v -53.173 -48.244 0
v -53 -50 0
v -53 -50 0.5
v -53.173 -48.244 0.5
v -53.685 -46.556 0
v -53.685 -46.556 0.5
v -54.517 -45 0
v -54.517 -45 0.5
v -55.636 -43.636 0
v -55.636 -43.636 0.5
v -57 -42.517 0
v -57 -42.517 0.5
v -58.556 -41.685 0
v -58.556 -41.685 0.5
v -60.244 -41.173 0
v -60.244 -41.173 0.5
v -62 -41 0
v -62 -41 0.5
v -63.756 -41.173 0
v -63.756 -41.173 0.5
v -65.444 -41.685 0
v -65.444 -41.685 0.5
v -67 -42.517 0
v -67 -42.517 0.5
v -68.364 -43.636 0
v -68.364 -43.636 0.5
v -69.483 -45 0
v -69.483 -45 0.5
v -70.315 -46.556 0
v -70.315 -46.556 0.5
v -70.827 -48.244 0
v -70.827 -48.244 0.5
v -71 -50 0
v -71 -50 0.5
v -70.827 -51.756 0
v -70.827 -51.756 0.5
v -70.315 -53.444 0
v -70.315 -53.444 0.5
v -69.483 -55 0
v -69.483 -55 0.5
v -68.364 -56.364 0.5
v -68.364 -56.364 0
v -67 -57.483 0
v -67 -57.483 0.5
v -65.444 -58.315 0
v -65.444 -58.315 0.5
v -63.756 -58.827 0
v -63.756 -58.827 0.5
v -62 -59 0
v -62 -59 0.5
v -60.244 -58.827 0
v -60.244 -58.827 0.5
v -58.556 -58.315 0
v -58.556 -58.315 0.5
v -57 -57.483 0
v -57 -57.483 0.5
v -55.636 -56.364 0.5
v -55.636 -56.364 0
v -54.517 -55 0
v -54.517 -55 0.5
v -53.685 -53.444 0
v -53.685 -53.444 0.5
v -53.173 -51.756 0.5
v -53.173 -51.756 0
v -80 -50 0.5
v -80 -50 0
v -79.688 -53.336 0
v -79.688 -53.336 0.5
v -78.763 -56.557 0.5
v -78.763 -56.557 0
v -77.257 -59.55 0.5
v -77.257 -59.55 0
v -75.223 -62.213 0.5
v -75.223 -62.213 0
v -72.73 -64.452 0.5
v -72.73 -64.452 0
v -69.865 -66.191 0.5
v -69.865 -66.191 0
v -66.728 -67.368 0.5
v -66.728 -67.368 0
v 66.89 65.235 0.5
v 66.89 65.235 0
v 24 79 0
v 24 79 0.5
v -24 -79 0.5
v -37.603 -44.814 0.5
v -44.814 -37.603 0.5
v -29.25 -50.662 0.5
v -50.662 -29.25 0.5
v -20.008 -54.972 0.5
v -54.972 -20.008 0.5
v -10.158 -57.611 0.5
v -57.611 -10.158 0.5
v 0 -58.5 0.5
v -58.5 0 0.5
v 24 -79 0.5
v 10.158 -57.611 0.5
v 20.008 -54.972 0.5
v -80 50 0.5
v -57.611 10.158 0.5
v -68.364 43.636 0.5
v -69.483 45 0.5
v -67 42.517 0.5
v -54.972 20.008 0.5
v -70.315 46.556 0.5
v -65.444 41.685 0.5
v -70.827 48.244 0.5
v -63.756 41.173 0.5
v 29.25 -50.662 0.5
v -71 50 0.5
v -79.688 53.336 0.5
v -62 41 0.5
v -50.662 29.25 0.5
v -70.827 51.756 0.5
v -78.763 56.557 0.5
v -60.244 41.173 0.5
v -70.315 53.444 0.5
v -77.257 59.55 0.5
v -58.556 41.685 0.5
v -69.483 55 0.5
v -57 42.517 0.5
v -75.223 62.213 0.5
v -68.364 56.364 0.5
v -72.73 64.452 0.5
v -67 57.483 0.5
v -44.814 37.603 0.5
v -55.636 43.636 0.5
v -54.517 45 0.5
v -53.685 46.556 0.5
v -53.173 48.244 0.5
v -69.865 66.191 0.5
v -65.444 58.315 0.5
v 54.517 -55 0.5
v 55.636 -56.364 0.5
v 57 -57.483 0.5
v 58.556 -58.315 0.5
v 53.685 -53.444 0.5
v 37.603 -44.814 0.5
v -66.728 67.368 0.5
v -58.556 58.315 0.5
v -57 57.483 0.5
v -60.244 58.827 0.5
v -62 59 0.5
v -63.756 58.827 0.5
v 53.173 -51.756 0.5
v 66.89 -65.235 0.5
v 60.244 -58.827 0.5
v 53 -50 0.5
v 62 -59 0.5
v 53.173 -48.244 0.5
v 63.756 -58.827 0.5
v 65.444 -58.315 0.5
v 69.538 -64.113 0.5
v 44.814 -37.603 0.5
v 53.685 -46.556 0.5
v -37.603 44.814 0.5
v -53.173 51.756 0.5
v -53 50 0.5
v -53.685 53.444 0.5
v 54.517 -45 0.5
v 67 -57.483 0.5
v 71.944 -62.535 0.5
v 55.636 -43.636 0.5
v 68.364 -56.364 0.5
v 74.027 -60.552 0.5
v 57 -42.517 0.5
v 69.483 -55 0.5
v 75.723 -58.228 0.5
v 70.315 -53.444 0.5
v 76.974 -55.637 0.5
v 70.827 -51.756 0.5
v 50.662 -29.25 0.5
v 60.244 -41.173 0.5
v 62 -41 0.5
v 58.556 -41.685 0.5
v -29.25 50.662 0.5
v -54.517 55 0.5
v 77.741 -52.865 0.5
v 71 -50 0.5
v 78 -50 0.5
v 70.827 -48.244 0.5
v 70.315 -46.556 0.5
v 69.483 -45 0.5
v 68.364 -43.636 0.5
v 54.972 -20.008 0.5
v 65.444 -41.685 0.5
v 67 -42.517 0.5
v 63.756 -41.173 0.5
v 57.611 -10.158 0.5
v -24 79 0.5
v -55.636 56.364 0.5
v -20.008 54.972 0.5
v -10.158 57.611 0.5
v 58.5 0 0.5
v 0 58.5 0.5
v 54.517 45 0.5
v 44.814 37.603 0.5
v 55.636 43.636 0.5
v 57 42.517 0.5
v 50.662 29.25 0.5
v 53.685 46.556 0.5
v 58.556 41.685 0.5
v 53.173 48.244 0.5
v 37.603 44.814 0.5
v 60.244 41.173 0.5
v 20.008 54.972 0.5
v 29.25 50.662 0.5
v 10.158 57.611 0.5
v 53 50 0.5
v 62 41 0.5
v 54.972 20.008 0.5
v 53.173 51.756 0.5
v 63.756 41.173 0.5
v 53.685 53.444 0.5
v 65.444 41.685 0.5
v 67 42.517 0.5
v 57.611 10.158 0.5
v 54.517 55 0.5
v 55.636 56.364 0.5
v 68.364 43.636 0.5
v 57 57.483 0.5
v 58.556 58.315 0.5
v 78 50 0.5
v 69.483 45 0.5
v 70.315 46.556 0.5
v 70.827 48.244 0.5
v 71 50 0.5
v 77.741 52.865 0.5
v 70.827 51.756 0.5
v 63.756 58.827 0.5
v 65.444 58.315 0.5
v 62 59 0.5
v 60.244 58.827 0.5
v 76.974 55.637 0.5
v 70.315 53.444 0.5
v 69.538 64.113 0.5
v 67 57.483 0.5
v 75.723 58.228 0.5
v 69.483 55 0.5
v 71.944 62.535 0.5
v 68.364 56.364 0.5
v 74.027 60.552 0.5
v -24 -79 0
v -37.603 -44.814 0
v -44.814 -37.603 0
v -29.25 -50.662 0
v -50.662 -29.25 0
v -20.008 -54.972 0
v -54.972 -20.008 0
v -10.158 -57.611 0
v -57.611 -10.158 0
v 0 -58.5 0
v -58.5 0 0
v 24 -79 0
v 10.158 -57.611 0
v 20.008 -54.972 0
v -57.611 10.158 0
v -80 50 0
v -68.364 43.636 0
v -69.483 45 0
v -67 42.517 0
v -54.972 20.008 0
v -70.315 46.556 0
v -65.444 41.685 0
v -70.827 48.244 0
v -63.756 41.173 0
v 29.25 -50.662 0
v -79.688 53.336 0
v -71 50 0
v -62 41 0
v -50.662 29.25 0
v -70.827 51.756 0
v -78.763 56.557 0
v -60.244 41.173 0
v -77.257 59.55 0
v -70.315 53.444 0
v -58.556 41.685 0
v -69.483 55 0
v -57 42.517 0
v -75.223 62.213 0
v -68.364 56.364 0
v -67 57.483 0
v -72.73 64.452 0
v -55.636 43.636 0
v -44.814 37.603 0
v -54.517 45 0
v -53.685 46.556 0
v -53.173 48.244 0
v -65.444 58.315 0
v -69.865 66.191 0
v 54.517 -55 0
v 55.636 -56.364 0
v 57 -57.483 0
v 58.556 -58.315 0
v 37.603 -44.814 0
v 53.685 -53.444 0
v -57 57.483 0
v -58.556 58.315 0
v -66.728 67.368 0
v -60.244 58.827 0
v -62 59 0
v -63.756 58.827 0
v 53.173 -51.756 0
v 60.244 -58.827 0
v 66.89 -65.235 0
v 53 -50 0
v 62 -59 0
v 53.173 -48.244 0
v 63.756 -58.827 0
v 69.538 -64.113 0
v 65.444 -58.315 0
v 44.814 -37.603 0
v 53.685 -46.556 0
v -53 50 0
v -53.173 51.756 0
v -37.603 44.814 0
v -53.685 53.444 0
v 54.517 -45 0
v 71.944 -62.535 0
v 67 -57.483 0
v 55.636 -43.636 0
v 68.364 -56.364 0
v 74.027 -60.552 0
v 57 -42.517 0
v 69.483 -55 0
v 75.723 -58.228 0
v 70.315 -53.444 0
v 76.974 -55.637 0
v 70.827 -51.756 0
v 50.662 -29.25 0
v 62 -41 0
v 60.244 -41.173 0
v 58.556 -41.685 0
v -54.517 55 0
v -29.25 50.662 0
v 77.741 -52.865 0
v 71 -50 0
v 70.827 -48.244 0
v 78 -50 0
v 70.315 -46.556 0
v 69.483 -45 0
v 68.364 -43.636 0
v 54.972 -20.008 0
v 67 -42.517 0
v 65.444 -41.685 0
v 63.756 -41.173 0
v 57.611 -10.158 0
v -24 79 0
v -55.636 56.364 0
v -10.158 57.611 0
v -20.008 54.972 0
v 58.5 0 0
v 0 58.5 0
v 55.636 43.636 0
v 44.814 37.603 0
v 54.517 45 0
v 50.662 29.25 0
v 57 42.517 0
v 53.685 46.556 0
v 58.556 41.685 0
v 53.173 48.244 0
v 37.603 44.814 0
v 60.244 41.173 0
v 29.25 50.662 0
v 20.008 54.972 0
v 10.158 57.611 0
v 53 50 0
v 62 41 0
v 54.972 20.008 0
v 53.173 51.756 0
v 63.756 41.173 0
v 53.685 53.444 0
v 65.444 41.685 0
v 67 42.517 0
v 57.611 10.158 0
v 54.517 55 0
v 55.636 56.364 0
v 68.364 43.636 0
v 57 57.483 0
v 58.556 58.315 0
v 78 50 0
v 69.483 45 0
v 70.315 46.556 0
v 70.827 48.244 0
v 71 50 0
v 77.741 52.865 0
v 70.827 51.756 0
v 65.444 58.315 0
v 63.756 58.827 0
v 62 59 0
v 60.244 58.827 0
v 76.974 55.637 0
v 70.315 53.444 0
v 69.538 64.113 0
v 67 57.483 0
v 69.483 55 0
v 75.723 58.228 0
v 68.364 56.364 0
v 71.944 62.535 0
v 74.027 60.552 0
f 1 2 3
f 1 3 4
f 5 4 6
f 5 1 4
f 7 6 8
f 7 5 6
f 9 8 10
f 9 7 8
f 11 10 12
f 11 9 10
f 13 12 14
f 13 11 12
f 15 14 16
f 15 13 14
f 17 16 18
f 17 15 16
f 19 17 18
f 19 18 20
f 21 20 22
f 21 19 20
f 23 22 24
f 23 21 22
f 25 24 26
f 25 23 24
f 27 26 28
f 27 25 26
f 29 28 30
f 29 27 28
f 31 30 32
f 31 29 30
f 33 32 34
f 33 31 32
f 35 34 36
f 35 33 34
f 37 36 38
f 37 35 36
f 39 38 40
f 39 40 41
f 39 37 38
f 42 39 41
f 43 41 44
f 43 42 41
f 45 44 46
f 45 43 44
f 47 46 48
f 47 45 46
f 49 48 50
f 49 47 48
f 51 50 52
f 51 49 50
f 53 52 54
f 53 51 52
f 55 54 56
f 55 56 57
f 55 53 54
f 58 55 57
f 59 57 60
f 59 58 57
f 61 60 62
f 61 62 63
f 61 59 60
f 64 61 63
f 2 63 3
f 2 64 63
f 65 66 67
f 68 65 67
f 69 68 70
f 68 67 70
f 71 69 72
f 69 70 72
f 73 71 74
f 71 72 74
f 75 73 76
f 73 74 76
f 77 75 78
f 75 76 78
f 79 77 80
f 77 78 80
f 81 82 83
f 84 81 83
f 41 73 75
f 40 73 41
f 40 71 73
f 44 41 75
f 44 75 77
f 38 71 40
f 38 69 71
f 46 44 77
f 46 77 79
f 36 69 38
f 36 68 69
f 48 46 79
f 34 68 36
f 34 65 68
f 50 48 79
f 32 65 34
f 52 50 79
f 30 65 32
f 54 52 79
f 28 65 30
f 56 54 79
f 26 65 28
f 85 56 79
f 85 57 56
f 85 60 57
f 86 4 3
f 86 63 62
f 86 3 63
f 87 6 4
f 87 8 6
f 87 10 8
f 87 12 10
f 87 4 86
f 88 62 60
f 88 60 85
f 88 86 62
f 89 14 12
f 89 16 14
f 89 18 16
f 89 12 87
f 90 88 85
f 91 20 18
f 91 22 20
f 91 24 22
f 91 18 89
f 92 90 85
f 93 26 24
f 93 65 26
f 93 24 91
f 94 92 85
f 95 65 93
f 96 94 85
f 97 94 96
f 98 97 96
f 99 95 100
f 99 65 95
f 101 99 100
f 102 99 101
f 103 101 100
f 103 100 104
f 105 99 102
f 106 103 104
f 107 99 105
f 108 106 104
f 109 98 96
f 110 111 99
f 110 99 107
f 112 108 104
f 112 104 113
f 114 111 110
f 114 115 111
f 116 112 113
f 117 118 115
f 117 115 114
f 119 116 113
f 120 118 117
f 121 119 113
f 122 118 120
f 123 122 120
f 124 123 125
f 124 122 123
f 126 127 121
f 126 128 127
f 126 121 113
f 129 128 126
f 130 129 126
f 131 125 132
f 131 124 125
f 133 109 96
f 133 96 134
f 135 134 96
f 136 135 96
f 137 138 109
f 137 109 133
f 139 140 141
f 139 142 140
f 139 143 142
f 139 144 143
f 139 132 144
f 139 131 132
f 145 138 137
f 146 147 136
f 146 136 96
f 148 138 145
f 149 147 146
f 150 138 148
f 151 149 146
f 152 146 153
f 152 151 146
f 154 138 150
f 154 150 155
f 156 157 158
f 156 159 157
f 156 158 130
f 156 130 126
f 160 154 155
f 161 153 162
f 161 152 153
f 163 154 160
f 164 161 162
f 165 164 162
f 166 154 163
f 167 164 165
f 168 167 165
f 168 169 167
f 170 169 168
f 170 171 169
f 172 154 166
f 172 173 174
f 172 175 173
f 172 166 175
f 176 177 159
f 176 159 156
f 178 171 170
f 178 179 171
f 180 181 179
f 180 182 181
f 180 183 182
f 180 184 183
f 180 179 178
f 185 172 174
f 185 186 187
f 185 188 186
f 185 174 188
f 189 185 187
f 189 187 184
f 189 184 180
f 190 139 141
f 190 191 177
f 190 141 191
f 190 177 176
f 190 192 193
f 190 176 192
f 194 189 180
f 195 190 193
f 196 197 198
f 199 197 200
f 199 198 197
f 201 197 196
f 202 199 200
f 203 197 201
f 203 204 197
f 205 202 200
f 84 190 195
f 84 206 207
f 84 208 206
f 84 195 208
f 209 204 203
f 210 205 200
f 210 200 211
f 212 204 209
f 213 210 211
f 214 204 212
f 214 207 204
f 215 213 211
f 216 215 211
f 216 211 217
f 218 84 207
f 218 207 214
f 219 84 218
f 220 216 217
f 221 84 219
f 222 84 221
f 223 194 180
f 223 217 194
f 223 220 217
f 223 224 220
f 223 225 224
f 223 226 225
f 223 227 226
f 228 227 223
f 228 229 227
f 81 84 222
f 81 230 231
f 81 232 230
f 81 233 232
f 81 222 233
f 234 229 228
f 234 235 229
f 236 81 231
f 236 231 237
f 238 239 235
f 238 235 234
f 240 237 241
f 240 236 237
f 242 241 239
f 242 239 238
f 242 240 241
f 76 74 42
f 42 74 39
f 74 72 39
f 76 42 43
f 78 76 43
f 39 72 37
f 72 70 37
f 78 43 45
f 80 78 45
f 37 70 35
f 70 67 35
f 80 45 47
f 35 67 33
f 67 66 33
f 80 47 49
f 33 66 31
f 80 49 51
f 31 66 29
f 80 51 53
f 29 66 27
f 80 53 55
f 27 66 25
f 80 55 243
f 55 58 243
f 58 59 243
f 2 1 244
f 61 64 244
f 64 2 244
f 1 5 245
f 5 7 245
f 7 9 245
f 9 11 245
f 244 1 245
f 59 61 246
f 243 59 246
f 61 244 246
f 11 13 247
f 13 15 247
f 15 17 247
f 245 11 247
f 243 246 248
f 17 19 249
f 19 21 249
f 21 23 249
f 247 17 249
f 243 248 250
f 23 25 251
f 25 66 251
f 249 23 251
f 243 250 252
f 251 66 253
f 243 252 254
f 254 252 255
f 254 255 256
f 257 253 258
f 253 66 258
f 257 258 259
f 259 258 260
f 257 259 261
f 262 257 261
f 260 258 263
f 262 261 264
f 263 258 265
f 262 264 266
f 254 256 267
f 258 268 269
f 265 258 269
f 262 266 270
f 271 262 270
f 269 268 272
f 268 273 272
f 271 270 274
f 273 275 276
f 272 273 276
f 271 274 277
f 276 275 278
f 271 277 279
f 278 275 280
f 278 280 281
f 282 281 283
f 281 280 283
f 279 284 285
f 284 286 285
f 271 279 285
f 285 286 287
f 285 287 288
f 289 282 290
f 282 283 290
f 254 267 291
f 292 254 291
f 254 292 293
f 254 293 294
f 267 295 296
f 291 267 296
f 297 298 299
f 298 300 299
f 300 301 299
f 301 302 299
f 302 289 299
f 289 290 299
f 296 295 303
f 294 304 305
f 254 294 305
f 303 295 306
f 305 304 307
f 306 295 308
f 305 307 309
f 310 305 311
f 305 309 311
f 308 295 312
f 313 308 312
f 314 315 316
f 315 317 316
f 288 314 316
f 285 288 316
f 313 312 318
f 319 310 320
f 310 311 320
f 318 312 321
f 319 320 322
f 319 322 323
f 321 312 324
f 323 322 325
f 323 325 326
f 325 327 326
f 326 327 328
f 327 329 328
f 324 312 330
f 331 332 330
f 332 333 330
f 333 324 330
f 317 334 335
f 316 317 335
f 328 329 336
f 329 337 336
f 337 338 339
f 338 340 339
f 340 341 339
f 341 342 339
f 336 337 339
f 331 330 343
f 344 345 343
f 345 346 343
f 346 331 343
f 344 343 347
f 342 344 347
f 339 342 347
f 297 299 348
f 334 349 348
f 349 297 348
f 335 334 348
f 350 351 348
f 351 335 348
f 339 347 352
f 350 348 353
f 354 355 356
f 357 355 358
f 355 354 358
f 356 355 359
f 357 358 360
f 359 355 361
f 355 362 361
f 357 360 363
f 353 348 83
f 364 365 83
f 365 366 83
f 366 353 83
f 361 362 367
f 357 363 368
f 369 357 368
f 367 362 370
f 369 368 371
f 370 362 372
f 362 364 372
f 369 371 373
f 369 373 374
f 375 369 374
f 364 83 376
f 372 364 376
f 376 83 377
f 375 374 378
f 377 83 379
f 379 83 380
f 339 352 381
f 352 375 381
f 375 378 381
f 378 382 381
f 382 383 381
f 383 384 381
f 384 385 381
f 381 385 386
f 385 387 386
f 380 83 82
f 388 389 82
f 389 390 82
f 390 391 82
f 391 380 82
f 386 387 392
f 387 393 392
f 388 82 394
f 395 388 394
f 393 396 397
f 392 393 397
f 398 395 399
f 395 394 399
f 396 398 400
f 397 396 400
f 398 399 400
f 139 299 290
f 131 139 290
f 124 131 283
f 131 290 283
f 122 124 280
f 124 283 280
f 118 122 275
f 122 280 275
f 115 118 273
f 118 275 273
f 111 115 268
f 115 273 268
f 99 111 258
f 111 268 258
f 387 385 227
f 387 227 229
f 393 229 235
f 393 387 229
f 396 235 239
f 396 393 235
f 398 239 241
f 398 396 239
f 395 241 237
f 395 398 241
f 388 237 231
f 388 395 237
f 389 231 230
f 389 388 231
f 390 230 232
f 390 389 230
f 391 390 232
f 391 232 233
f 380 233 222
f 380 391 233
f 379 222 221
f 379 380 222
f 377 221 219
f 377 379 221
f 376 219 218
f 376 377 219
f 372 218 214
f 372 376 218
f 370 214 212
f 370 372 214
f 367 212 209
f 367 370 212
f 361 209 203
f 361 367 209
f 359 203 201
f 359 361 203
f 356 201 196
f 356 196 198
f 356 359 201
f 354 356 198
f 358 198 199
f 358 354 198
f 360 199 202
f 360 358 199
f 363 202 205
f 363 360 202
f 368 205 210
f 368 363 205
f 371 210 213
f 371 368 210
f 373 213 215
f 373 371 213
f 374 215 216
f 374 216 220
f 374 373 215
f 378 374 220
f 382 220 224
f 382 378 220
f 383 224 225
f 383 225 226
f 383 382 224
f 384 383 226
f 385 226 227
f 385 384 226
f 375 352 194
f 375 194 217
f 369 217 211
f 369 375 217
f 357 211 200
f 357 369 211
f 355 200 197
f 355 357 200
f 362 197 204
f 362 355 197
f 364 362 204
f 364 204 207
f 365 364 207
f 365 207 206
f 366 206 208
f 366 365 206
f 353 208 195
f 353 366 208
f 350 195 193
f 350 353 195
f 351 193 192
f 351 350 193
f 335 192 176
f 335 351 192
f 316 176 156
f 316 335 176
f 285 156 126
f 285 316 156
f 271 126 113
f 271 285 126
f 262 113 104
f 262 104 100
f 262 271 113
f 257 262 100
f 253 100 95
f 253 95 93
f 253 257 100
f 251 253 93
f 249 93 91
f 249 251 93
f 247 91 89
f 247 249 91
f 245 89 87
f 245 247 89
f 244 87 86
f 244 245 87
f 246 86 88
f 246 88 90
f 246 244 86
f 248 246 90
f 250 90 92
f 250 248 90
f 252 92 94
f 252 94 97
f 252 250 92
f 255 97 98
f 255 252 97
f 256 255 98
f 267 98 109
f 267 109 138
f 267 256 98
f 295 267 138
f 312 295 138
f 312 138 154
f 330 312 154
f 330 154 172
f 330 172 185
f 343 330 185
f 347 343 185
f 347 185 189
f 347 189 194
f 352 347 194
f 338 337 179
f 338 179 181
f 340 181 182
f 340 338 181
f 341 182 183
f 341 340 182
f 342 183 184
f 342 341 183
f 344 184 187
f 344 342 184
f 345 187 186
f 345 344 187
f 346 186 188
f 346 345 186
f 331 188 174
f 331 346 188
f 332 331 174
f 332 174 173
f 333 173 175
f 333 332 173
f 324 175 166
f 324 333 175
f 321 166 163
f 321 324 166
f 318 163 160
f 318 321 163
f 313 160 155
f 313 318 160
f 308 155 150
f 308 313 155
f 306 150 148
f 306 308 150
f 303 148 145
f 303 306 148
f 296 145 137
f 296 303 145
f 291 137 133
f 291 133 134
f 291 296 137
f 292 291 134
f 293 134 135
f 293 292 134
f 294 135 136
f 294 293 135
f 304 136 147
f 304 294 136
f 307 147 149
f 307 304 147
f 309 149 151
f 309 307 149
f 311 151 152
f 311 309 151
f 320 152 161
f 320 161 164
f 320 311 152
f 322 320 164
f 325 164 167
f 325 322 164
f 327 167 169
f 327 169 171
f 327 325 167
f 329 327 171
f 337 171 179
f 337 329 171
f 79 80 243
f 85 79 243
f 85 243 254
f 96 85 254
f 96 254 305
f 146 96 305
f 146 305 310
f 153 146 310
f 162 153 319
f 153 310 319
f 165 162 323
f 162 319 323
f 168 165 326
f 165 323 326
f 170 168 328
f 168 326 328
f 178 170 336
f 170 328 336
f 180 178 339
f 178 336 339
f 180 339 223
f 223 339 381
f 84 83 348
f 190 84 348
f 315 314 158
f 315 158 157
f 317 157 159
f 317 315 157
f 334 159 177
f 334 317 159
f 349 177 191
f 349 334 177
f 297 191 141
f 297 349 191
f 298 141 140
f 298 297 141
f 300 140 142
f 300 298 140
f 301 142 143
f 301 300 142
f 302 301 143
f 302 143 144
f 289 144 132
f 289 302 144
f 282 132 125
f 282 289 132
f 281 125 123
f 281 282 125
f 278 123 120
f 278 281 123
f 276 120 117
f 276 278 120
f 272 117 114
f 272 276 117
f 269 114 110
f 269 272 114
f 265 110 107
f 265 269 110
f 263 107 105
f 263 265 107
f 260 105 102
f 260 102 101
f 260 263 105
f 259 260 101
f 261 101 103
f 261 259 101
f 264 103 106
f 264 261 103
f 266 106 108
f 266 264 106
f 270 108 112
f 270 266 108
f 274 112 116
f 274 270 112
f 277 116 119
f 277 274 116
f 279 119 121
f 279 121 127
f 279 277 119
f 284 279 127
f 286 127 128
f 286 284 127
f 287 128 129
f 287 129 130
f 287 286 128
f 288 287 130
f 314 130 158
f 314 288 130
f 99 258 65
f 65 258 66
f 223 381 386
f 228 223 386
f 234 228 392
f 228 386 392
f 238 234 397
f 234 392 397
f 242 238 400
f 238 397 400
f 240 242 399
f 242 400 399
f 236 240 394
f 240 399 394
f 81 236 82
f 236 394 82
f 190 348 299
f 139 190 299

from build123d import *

# Parameters (mm, degrees)
SKETCH1_R      = 58.5
SKETCH1_R_2    = 9
EXTRUDE1_DEPTH = 0.5


with BuildPart() as part:
    # Sketch1 → Extrude1 (new body)
    with BuildSketch(Plane.XY):
        with BuildLine():
            Line((-66.728148699, -67.367918985), (-24, -79))
            Line((-24, -79), (24, -79))
            Line((24, -79), (66.889545754, -65.234577195))
            ThreePointArc((66.889545754, -65.234577195), (74.927349536, -59.427811727), (78, -50))
            Line((78, -50), (78, 50))
            ThreePointArc((78, 50), (74.927349536, 59.427811727), (66.889545754, 65.234577195))
            Line((66.889545754, 65.234577195), (24, 79))
            Line((24, 79), (-24, 79))
            Line((-24, 79), (-66.728148699, 67.367918985))
            ThreePointArc((-66.728148699, 67.367918985), (-76.302214454, 60.929165645), (-80, 50))
            Line((-80, 50), (-80, -50))
            ThreePointArc((-80, -50), (-76.302214454, -60.929165645), (-66.728148699, -67.367918985))
        make_face()
        Circle(SKETCH1_R, mode=Mode.SUBTRACT)
        with Locations((62, -50)):
            Circle(SKETCH1_R_2, mode=Mode.SUBTRACT)
        with Locations((-62, -50)):
            Circle(SKETCH1_R_2, mode=Mode.SUBTRACT)
        with Locations((62, 50)):
            Circle(SKETCH1_R_2, mode=Mode.SUBTRACT)
        with Locations((-62, 50)):
            Circle(SKETCH1_R_2, mode=Mode.SUBTRACT)
    extrude(amount=EXTRUDE1_DEPTH)


solid = part.part
